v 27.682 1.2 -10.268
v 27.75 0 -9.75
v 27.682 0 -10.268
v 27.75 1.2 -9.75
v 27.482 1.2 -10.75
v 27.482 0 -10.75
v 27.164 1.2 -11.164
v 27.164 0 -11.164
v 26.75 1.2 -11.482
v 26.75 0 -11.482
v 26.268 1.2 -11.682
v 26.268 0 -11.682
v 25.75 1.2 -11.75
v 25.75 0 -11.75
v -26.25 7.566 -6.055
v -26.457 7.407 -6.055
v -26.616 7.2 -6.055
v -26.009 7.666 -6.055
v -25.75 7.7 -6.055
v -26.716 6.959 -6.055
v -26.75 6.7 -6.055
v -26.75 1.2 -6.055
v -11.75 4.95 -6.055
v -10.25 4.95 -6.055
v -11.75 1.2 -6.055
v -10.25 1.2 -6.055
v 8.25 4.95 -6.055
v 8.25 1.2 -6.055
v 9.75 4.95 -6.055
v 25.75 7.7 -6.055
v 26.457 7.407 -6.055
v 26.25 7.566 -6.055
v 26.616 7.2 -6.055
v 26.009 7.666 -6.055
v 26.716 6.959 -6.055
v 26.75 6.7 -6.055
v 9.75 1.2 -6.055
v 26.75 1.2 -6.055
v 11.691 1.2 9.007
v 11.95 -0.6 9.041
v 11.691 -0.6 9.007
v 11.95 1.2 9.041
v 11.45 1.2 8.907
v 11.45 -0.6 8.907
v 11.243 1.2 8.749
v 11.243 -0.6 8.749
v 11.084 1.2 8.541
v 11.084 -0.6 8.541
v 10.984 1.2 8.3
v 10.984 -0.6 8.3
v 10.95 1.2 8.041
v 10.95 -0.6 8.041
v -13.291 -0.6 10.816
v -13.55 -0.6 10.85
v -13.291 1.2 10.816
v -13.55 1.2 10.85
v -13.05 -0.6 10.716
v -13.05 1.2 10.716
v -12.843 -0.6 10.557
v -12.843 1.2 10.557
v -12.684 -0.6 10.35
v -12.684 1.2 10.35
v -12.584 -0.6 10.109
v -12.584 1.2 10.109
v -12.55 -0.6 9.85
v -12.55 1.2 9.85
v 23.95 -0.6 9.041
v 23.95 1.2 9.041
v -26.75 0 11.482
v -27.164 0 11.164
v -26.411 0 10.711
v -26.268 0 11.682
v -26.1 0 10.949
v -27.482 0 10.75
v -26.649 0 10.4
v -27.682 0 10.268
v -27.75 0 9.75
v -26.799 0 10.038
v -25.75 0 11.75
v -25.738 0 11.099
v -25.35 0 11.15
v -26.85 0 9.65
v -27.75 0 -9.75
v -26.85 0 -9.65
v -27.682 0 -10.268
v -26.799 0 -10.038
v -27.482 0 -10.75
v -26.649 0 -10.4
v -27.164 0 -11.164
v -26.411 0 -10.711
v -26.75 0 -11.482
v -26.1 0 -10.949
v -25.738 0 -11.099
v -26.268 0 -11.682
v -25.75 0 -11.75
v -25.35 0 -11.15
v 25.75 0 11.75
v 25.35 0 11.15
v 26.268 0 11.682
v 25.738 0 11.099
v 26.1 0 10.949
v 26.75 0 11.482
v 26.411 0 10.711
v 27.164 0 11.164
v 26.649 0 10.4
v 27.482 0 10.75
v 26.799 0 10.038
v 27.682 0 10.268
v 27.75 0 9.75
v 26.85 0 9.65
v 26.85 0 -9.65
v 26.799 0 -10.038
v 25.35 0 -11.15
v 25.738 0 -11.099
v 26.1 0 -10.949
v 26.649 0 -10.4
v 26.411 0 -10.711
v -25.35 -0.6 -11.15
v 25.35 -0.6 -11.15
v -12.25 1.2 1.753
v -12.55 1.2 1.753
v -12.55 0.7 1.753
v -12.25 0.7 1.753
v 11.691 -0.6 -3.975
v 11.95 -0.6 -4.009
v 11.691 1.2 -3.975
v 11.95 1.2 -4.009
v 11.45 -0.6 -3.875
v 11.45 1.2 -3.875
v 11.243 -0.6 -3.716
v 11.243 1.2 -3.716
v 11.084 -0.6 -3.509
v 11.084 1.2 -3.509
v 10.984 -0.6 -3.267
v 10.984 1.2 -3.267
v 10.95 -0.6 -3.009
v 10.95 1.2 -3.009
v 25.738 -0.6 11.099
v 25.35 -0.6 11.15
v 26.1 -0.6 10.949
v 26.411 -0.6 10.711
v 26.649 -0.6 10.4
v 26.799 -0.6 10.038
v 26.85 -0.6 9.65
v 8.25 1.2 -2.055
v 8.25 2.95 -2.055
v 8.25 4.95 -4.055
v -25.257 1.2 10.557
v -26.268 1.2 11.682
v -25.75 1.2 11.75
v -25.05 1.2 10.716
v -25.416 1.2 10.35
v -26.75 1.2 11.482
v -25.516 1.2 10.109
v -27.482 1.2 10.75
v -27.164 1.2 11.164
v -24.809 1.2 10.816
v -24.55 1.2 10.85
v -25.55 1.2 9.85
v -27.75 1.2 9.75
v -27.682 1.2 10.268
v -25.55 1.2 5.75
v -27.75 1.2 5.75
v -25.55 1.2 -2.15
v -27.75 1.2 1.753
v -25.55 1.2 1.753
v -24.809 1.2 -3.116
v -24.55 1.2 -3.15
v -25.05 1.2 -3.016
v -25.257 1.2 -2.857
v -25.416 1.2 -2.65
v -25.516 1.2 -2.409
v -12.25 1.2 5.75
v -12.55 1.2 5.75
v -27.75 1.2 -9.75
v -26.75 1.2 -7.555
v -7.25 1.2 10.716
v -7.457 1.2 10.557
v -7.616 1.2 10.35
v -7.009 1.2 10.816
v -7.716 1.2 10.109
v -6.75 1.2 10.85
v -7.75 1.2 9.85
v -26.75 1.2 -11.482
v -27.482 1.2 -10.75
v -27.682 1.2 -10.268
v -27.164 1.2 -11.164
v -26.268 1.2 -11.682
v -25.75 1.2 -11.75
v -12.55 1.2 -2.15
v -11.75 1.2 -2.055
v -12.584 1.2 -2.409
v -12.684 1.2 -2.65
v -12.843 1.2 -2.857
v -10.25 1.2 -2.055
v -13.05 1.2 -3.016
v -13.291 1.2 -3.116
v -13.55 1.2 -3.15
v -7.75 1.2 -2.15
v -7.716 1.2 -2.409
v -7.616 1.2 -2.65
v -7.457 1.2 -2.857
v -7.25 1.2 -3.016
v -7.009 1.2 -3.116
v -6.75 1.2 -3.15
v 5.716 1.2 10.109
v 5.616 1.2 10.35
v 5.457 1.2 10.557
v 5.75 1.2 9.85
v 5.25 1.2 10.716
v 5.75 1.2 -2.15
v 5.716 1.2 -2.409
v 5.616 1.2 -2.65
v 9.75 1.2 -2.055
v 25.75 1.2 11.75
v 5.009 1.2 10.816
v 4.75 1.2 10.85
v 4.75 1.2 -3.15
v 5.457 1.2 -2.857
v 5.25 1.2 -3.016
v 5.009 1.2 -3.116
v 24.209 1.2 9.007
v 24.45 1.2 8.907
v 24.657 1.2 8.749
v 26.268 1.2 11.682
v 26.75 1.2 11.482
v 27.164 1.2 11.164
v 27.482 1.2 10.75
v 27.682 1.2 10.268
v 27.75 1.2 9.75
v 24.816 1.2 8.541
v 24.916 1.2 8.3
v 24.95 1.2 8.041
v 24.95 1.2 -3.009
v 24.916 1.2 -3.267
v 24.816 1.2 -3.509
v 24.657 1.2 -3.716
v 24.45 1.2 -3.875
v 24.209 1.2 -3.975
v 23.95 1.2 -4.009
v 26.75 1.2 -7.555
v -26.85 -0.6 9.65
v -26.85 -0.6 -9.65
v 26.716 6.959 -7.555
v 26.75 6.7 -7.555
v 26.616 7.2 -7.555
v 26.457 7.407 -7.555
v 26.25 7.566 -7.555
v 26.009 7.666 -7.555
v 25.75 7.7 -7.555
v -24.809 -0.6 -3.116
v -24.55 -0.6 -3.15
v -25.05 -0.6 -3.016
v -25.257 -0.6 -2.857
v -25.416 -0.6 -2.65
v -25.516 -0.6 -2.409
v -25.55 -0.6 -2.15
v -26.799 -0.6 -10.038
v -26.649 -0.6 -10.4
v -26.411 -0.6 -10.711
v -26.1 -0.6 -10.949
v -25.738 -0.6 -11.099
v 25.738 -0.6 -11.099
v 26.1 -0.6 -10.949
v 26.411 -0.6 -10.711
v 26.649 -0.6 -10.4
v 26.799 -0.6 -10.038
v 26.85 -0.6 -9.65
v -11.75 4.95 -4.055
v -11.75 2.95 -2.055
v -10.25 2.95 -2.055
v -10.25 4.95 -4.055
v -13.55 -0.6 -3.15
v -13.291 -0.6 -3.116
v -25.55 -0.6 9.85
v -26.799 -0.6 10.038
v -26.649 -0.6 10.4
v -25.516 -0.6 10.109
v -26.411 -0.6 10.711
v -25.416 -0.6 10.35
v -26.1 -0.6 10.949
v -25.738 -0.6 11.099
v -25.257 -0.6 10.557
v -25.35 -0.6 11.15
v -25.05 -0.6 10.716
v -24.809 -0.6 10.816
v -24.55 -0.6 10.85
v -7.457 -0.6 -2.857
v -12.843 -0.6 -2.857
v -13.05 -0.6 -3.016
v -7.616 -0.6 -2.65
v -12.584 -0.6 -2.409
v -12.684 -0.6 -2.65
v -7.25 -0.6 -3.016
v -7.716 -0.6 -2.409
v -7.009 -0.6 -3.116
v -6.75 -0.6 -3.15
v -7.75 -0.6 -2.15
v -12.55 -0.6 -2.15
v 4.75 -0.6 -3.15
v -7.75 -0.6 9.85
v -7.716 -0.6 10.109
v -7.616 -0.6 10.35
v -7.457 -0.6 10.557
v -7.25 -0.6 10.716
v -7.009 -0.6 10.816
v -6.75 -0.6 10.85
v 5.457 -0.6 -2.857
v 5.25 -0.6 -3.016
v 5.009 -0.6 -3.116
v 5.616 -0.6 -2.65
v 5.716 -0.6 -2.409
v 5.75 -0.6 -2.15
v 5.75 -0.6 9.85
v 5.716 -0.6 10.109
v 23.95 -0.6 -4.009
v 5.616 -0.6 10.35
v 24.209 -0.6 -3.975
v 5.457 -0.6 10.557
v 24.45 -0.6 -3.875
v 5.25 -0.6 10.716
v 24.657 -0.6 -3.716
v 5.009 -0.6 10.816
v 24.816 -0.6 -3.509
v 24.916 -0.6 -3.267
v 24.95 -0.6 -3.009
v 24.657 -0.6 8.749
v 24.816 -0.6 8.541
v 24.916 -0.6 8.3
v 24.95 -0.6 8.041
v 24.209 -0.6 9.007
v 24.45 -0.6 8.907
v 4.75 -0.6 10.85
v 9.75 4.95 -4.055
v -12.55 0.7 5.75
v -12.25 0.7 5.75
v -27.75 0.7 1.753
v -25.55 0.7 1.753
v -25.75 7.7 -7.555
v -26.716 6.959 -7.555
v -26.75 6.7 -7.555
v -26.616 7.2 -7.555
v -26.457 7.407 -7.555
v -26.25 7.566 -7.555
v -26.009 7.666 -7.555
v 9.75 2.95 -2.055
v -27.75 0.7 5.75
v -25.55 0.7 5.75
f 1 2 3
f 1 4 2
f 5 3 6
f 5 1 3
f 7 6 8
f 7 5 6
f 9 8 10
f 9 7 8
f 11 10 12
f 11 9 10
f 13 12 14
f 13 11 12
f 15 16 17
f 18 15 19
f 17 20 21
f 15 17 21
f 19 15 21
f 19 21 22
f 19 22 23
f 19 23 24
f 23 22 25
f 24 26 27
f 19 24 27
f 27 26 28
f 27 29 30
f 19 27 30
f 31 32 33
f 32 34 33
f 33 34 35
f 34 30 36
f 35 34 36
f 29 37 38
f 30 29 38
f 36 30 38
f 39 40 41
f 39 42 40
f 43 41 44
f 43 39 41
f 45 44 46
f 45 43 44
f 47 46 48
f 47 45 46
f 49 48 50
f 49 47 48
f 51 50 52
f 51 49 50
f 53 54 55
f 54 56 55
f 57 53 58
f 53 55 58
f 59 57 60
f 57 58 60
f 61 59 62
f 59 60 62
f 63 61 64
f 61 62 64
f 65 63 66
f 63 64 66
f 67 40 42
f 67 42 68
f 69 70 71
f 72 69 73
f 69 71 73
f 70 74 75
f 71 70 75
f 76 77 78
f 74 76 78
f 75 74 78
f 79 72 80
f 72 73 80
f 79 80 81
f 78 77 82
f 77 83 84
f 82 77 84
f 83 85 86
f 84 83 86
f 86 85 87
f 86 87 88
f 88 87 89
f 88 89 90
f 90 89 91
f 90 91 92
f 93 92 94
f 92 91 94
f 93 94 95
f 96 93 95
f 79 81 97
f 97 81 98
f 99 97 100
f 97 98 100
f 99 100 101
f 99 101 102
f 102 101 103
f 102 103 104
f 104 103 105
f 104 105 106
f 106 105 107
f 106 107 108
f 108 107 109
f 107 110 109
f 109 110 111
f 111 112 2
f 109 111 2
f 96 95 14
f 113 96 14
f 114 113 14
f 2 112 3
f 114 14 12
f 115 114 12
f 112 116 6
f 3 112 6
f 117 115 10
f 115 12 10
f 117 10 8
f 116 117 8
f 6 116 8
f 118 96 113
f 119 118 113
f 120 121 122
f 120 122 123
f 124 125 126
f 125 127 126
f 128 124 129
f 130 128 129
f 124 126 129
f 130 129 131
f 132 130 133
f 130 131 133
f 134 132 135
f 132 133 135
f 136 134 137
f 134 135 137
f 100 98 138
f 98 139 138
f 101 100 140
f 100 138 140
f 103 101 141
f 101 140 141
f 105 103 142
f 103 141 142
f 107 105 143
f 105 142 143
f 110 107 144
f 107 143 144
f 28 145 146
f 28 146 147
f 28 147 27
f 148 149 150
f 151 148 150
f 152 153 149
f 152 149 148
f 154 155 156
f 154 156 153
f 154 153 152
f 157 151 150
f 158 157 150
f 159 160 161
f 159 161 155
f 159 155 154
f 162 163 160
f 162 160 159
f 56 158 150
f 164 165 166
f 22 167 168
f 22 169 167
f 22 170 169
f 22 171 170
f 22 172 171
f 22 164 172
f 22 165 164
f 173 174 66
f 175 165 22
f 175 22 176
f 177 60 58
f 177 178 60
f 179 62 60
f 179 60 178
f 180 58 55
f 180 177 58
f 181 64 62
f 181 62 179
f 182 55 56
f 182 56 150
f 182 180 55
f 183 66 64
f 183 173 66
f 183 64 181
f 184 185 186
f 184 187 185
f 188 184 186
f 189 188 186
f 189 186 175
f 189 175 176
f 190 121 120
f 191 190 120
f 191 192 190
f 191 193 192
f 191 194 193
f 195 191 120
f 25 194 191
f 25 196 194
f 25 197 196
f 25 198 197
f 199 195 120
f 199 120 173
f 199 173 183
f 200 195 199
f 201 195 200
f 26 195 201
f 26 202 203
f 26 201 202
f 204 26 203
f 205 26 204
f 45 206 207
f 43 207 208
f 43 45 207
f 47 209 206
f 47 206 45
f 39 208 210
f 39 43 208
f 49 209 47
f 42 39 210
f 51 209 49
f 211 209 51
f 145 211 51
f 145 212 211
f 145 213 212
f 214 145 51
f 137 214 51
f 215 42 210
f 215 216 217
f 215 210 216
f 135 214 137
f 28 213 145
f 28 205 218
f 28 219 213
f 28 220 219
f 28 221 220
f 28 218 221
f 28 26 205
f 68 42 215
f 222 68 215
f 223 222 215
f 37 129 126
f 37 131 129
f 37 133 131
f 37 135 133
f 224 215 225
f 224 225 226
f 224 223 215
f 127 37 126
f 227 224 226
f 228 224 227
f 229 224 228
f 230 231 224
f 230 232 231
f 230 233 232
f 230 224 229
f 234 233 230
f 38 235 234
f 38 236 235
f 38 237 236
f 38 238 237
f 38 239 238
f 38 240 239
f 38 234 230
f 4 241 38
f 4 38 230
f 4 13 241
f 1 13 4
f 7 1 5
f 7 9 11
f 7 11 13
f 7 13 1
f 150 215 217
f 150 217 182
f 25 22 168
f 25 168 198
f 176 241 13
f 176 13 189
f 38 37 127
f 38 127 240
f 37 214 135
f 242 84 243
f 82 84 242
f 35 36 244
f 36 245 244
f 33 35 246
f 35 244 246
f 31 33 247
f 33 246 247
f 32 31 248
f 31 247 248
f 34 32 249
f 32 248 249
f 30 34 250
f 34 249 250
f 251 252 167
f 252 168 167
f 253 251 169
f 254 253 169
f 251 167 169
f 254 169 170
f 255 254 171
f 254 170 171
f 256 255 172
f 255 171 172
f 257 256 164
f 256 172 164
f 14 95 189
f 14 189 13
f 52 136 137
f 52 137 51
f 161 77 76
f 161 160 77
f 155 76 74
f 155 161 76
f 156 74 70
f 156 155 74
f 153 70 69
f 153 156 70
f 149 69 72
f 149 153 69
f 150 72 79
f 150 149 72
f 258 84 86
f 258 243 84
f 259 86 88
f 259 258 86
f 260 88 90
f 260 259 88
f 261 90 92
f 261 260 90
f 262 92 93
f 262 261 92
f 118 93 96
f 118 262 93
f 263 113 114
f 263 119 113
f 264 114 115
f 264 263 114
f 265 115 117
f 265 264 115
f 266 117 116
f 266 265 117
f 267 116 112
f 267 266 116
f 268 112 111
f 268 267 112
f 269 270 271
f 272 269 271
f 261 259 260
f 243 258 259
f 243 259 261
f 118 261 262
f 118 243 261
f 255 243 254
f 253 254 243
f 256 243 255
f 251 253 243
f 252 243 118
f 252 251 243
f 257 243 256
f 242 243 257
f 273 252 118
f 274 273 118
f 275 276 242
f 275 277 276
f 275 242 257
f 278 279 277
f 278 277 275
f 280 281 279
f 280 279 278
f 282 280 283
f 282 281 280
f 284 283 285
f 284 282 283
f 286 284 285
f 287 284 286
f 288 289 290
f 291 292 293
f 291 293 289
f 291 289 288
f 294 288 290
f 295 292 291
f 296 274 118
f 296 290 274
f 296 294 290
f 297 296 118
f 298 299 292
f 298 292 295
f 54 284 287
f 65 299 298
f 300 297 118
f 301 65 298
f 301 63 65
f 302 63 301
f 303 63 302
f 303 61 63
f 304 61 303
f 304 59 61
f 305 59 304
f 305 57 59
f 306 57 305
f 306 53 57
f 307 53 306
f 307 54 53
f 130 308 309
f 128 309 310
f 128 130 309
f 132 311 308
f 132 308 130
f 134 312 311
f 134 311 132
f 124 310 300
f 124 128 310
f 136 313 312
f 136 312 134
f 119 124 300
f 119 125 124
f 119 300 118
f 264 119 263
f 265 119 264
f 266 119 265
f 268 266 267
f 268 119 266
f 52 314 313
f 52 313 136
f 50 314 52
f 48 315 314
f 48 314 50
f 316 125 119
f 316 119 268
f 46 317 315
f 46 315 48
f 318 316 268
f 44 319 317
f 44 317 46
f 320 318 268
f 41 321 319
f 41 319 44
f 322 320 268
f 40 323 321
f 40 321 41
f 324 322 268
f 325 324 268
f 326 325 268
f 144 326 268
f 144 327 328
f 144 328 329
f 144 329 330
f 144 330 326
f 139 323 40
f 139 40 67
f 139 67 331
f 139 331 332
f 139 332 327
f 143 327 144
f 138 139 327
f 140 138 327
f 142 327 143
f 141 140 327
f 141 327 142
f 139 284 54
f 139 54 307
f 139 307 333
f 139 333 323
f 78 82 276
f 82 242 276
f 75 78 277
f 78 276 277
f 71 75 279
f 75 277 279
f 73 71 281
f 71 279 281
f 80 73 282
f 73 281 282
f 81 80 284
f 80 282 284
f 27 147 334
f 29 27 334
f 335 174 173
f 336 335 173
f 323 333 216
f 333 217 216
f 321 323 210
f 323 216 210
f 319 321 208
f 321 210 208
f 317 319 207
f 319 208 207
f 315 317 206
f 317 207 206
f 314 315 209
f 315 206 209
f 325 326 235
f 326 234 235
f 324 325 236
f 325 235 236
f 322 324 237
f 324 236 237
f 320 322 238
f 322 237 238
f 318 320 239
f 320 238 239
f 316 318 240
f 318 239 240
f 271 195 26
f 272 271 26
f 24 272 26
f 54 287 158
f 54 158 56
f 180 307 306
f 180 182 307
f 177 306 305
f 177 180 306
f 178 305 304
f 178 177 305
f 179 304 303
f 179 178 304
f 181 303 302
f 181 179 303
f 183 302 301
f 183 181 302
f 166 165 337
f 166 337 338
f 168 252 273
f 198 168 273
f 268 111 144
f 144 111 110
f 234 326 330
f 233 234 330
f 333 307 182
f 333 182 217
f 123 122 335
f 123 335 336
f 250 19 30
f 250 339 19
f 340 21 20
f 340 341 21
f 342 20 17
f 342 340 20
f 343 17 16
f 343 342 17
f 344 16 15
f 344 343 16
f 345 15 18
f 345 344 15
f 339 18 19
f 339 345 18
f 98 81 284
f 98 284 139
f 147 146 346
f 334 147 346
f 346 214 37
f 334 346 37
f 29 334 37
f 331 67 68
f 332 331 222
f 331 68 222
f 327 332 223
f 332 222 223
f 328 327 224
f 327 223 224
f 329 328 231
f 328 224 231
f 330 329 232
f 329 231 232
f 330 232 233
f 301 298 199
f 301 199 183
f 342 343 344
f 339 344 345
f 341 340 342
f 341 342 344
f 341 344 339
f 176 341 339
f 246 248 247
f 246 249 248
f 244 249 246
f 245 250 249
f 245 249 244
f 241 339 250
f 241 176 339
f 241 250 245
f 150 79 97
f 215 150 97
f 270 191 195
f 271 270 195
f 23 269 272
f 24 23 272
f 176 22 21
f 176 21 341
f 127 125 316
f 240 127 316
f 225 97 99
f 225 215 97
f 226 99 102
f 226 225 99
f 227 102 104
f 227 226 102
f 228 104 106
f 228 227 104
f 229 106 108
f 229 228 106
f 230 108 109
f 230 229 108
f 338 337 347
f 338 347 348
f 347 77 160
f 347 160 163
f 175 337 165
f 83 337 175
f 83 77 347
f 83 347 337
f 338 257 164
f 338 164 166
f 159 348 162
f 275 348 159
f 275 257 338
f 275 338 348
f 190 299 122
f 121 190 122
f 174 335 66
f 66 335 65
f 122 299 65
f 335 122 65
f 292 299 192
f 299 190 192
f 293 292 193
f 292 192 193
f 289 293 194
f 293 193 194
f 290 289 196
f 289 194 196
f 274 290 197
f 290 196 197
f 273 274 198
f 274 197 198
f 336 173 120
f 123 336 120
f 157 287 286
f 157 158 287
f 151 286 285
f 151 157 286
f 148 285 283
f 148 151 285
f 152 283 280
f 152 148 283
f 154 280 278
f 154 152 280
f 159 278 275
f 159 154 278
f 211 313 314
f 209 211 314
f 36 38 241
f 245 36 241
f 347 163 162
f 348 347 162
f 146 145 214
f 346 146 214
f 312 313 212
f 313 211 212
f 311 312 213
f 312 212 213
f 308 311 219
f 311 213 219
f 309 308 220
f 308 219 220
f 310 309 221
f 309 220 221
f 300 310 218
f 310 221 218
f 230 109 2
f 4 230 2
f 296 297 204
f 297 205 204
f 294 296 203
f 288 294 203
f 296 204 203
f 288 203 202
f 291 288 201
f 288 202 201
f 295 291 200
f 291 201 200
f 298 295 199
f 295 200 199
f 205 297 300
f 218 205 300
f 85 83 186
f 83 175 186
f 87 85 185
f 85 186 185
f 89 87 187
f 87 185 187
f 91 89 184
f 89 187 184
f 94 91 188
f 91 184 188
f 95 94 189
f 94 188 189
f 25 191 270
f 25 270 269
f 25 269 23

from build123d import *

# Parameters (mm, degrees)
SKETCH_1_W          = 55.5
SKETCH_1_H          = 23.5
EXTRUDE_1_DEPTH     = 1.2
FILLET_1_R          = 2
SKETCH_2_W          = 53.7
SKETCH_2_H          = 22.3
EXTRUDE_2_DEPTH     = 0.6
SKETCH_3_W          = 13
SKETCH_3_H          = 14
SKETCH_3_W_2        = 13.5
SKETCH_3_W_3        = 14
SKETCH_3_H_2        = 13.05
CUT_EXTRUDE_1_DEPTH = 3
FILLET_2_R          = 1
SKETCH_4_W          = 15.5
SKETCH_4_H          = 3.997435945
CUT_EXTRUDE_2_DEPTH = 0.5
SKETCH_5_W          = 53.5
SKETCH_5_H          = 1.5
EXTRUDE_3_DEPTH     = 6.5
FILLET_3_R          = 1
SKETCH_6_W          = 1.5
SKETCH_6_H          = 4
EXTRUDE_4_DEPTH     = 3.75
CHAMFER_1_SIZE      = 2
FILLET_4_R          = 1.5


with BuildPart() as part:
    # 草图1 → 凸台-拉伸1 (new body)
    with BuildSketch(Plane(origin=(0, 0, 0), x_dir=(1, 0, 0), z_dir=(0, 1, 0))):
        Rectangle(SKETCH_1_W, SKETCH_1_H)
    extrude(amount=EXTRUDE_1_DEPTH)

    # 圆角1
    fillet_1_edges = [part.edges().sort_by_distance(p)[0] for p in [
        (27.75, 0.6, 11.75),
        (-27.75, 0.6, 11.75),
        (-27.75, 0.6, -11.75),
        (27.75, 0.6, -11.75),
    ]]
    fillet(fillet_1_edges, radius=FILLET_1_R)

    # 草图2 → 凸台-拉伸2 (add)
    with BuildSketch(Plane.XZ):
        Rectangle(SKETCH_2_W, SKETCH_2_H)
    extrude(amount=EXTRUDE_2_DEPTH)

    # 草图3 → 切除-拉伸1 (cut)
    with BuildSketch(Plane.XZ.offset(0.6)):
        with Locations((-19.05, 3.85)):
            Rectangle(SKETCH_3_W, SKETCH_3_H)
        with Locations((-1, 3.85)):
            Rectangle(SKETCH_3_W_2, SKETCH_3_H)
        with Locations((17.95, 2.516421356)):
            Rectangle(SKETCH_3_W_3, SKETCH_3_H_2)
    extrude(amount=-CUT_EXTRUDE_1_DEPTH, mode=Mode.SUBTRACT)

    # 圆角2
    fillet_2_edges = [part.edges().sort_by_distance(p)[0] for p in [
        (-25.55, 0.3, -3.15),
        (-25.55, 0.3, 10.85),
        (-12.55, 0.3, 10.85),
        (-12.55, 0.3, -3.15),
        (-7.75, 0.3, -3.15),
        (-7.75, 0.3, 10.85),
        (5.75, 0.3, 10.85),
        (5.75, 0.3, -3.15),
        (10.95, 0.3, -4.008578644),
        (10.95, 0.3, 9.041421356),
        (24.95, 0.3, 9.041421356),
        (24.95, 0.3, -4.008578644),
    ]]
    fillet(fillet_2_edges, radius=FILLET_2_R)

    # 草图4 → 切除-拉伸2 (cut)
    with BuildSketch(Plane(origin=(0, 1.2, 0), x_dir=(1, 0, 0), z_dir=(0, 1, 0))):
        with Locations((-20, -3.751282028)):
            Rectangle(SKETCH_4_W, SKETCH_4_H)
    extrude(amount=-CUT_EXTRUDE_2_DEPTH, mode=Mode.SUBTRACT)

    # 草图5 → 凸台-拉伸3 (add)
    with BuildSketch(Plane(origin=(0, 1.2, 0), x_dir=(1, 0, 0), z_dir=(0, 1, 0))):
        with Locations((0, 6.804632487)):
            Rectangle(SKETCH_5_W, SKETCH_5_H)
    extrude(amount=EXTRUDE_3_DEPTH)

    # 圆角3
    fillet_3_edges = [part.edges().sort_by_distance(p)[0] for p in [
        (26.75, 7.7, -6.804632487),
        (-26.75, 7.7, -6.804632487),
    ]]
    fillet(fillet_3_edges, radius=FILLET_3_R)

    # 草图6 → 凸台-拉伸4 (add)
    with BuildSketch(Plane(origin=(0, 1.2, 0), x_dir=(1, 0, 0), z_dir=(0, 1, 0))):
        with Locations((9, 4.054632487)):
            Rectangle(SKETCH_6_W, SKETCH_6_H)
        with Locations((-11, 4.054632487)):
            Rectangle(SKETCH_6_W, SKETCH_6_H)
    extrude(amount=EXTRUDE_4_DEPTH)

    # 倒角1
    chamfer_1_edges = [part.edges().sort_by_distance(p)[0] for p in [
        (9, 4.95, -2.054632487),
        (-11, 4.95, -2.054632487),
    ]]
    chamfer(chamfer_1_edges, length=CHAMFER_1_SIZE)

    # 圆角4
    fillet_4_edges = [part.edges().sort_by_distance(p)[0] for p in [
        (-26.85, -0.3, 11.15),
        (-26.85, -0.3, -11.15),
        (26.85, -0.3, -11.15),
        (26.85, -0.3, 11.15),
    ]]
    fillet(fillet_4_edges, radius=FILLET_4_R)


solid = part.part
